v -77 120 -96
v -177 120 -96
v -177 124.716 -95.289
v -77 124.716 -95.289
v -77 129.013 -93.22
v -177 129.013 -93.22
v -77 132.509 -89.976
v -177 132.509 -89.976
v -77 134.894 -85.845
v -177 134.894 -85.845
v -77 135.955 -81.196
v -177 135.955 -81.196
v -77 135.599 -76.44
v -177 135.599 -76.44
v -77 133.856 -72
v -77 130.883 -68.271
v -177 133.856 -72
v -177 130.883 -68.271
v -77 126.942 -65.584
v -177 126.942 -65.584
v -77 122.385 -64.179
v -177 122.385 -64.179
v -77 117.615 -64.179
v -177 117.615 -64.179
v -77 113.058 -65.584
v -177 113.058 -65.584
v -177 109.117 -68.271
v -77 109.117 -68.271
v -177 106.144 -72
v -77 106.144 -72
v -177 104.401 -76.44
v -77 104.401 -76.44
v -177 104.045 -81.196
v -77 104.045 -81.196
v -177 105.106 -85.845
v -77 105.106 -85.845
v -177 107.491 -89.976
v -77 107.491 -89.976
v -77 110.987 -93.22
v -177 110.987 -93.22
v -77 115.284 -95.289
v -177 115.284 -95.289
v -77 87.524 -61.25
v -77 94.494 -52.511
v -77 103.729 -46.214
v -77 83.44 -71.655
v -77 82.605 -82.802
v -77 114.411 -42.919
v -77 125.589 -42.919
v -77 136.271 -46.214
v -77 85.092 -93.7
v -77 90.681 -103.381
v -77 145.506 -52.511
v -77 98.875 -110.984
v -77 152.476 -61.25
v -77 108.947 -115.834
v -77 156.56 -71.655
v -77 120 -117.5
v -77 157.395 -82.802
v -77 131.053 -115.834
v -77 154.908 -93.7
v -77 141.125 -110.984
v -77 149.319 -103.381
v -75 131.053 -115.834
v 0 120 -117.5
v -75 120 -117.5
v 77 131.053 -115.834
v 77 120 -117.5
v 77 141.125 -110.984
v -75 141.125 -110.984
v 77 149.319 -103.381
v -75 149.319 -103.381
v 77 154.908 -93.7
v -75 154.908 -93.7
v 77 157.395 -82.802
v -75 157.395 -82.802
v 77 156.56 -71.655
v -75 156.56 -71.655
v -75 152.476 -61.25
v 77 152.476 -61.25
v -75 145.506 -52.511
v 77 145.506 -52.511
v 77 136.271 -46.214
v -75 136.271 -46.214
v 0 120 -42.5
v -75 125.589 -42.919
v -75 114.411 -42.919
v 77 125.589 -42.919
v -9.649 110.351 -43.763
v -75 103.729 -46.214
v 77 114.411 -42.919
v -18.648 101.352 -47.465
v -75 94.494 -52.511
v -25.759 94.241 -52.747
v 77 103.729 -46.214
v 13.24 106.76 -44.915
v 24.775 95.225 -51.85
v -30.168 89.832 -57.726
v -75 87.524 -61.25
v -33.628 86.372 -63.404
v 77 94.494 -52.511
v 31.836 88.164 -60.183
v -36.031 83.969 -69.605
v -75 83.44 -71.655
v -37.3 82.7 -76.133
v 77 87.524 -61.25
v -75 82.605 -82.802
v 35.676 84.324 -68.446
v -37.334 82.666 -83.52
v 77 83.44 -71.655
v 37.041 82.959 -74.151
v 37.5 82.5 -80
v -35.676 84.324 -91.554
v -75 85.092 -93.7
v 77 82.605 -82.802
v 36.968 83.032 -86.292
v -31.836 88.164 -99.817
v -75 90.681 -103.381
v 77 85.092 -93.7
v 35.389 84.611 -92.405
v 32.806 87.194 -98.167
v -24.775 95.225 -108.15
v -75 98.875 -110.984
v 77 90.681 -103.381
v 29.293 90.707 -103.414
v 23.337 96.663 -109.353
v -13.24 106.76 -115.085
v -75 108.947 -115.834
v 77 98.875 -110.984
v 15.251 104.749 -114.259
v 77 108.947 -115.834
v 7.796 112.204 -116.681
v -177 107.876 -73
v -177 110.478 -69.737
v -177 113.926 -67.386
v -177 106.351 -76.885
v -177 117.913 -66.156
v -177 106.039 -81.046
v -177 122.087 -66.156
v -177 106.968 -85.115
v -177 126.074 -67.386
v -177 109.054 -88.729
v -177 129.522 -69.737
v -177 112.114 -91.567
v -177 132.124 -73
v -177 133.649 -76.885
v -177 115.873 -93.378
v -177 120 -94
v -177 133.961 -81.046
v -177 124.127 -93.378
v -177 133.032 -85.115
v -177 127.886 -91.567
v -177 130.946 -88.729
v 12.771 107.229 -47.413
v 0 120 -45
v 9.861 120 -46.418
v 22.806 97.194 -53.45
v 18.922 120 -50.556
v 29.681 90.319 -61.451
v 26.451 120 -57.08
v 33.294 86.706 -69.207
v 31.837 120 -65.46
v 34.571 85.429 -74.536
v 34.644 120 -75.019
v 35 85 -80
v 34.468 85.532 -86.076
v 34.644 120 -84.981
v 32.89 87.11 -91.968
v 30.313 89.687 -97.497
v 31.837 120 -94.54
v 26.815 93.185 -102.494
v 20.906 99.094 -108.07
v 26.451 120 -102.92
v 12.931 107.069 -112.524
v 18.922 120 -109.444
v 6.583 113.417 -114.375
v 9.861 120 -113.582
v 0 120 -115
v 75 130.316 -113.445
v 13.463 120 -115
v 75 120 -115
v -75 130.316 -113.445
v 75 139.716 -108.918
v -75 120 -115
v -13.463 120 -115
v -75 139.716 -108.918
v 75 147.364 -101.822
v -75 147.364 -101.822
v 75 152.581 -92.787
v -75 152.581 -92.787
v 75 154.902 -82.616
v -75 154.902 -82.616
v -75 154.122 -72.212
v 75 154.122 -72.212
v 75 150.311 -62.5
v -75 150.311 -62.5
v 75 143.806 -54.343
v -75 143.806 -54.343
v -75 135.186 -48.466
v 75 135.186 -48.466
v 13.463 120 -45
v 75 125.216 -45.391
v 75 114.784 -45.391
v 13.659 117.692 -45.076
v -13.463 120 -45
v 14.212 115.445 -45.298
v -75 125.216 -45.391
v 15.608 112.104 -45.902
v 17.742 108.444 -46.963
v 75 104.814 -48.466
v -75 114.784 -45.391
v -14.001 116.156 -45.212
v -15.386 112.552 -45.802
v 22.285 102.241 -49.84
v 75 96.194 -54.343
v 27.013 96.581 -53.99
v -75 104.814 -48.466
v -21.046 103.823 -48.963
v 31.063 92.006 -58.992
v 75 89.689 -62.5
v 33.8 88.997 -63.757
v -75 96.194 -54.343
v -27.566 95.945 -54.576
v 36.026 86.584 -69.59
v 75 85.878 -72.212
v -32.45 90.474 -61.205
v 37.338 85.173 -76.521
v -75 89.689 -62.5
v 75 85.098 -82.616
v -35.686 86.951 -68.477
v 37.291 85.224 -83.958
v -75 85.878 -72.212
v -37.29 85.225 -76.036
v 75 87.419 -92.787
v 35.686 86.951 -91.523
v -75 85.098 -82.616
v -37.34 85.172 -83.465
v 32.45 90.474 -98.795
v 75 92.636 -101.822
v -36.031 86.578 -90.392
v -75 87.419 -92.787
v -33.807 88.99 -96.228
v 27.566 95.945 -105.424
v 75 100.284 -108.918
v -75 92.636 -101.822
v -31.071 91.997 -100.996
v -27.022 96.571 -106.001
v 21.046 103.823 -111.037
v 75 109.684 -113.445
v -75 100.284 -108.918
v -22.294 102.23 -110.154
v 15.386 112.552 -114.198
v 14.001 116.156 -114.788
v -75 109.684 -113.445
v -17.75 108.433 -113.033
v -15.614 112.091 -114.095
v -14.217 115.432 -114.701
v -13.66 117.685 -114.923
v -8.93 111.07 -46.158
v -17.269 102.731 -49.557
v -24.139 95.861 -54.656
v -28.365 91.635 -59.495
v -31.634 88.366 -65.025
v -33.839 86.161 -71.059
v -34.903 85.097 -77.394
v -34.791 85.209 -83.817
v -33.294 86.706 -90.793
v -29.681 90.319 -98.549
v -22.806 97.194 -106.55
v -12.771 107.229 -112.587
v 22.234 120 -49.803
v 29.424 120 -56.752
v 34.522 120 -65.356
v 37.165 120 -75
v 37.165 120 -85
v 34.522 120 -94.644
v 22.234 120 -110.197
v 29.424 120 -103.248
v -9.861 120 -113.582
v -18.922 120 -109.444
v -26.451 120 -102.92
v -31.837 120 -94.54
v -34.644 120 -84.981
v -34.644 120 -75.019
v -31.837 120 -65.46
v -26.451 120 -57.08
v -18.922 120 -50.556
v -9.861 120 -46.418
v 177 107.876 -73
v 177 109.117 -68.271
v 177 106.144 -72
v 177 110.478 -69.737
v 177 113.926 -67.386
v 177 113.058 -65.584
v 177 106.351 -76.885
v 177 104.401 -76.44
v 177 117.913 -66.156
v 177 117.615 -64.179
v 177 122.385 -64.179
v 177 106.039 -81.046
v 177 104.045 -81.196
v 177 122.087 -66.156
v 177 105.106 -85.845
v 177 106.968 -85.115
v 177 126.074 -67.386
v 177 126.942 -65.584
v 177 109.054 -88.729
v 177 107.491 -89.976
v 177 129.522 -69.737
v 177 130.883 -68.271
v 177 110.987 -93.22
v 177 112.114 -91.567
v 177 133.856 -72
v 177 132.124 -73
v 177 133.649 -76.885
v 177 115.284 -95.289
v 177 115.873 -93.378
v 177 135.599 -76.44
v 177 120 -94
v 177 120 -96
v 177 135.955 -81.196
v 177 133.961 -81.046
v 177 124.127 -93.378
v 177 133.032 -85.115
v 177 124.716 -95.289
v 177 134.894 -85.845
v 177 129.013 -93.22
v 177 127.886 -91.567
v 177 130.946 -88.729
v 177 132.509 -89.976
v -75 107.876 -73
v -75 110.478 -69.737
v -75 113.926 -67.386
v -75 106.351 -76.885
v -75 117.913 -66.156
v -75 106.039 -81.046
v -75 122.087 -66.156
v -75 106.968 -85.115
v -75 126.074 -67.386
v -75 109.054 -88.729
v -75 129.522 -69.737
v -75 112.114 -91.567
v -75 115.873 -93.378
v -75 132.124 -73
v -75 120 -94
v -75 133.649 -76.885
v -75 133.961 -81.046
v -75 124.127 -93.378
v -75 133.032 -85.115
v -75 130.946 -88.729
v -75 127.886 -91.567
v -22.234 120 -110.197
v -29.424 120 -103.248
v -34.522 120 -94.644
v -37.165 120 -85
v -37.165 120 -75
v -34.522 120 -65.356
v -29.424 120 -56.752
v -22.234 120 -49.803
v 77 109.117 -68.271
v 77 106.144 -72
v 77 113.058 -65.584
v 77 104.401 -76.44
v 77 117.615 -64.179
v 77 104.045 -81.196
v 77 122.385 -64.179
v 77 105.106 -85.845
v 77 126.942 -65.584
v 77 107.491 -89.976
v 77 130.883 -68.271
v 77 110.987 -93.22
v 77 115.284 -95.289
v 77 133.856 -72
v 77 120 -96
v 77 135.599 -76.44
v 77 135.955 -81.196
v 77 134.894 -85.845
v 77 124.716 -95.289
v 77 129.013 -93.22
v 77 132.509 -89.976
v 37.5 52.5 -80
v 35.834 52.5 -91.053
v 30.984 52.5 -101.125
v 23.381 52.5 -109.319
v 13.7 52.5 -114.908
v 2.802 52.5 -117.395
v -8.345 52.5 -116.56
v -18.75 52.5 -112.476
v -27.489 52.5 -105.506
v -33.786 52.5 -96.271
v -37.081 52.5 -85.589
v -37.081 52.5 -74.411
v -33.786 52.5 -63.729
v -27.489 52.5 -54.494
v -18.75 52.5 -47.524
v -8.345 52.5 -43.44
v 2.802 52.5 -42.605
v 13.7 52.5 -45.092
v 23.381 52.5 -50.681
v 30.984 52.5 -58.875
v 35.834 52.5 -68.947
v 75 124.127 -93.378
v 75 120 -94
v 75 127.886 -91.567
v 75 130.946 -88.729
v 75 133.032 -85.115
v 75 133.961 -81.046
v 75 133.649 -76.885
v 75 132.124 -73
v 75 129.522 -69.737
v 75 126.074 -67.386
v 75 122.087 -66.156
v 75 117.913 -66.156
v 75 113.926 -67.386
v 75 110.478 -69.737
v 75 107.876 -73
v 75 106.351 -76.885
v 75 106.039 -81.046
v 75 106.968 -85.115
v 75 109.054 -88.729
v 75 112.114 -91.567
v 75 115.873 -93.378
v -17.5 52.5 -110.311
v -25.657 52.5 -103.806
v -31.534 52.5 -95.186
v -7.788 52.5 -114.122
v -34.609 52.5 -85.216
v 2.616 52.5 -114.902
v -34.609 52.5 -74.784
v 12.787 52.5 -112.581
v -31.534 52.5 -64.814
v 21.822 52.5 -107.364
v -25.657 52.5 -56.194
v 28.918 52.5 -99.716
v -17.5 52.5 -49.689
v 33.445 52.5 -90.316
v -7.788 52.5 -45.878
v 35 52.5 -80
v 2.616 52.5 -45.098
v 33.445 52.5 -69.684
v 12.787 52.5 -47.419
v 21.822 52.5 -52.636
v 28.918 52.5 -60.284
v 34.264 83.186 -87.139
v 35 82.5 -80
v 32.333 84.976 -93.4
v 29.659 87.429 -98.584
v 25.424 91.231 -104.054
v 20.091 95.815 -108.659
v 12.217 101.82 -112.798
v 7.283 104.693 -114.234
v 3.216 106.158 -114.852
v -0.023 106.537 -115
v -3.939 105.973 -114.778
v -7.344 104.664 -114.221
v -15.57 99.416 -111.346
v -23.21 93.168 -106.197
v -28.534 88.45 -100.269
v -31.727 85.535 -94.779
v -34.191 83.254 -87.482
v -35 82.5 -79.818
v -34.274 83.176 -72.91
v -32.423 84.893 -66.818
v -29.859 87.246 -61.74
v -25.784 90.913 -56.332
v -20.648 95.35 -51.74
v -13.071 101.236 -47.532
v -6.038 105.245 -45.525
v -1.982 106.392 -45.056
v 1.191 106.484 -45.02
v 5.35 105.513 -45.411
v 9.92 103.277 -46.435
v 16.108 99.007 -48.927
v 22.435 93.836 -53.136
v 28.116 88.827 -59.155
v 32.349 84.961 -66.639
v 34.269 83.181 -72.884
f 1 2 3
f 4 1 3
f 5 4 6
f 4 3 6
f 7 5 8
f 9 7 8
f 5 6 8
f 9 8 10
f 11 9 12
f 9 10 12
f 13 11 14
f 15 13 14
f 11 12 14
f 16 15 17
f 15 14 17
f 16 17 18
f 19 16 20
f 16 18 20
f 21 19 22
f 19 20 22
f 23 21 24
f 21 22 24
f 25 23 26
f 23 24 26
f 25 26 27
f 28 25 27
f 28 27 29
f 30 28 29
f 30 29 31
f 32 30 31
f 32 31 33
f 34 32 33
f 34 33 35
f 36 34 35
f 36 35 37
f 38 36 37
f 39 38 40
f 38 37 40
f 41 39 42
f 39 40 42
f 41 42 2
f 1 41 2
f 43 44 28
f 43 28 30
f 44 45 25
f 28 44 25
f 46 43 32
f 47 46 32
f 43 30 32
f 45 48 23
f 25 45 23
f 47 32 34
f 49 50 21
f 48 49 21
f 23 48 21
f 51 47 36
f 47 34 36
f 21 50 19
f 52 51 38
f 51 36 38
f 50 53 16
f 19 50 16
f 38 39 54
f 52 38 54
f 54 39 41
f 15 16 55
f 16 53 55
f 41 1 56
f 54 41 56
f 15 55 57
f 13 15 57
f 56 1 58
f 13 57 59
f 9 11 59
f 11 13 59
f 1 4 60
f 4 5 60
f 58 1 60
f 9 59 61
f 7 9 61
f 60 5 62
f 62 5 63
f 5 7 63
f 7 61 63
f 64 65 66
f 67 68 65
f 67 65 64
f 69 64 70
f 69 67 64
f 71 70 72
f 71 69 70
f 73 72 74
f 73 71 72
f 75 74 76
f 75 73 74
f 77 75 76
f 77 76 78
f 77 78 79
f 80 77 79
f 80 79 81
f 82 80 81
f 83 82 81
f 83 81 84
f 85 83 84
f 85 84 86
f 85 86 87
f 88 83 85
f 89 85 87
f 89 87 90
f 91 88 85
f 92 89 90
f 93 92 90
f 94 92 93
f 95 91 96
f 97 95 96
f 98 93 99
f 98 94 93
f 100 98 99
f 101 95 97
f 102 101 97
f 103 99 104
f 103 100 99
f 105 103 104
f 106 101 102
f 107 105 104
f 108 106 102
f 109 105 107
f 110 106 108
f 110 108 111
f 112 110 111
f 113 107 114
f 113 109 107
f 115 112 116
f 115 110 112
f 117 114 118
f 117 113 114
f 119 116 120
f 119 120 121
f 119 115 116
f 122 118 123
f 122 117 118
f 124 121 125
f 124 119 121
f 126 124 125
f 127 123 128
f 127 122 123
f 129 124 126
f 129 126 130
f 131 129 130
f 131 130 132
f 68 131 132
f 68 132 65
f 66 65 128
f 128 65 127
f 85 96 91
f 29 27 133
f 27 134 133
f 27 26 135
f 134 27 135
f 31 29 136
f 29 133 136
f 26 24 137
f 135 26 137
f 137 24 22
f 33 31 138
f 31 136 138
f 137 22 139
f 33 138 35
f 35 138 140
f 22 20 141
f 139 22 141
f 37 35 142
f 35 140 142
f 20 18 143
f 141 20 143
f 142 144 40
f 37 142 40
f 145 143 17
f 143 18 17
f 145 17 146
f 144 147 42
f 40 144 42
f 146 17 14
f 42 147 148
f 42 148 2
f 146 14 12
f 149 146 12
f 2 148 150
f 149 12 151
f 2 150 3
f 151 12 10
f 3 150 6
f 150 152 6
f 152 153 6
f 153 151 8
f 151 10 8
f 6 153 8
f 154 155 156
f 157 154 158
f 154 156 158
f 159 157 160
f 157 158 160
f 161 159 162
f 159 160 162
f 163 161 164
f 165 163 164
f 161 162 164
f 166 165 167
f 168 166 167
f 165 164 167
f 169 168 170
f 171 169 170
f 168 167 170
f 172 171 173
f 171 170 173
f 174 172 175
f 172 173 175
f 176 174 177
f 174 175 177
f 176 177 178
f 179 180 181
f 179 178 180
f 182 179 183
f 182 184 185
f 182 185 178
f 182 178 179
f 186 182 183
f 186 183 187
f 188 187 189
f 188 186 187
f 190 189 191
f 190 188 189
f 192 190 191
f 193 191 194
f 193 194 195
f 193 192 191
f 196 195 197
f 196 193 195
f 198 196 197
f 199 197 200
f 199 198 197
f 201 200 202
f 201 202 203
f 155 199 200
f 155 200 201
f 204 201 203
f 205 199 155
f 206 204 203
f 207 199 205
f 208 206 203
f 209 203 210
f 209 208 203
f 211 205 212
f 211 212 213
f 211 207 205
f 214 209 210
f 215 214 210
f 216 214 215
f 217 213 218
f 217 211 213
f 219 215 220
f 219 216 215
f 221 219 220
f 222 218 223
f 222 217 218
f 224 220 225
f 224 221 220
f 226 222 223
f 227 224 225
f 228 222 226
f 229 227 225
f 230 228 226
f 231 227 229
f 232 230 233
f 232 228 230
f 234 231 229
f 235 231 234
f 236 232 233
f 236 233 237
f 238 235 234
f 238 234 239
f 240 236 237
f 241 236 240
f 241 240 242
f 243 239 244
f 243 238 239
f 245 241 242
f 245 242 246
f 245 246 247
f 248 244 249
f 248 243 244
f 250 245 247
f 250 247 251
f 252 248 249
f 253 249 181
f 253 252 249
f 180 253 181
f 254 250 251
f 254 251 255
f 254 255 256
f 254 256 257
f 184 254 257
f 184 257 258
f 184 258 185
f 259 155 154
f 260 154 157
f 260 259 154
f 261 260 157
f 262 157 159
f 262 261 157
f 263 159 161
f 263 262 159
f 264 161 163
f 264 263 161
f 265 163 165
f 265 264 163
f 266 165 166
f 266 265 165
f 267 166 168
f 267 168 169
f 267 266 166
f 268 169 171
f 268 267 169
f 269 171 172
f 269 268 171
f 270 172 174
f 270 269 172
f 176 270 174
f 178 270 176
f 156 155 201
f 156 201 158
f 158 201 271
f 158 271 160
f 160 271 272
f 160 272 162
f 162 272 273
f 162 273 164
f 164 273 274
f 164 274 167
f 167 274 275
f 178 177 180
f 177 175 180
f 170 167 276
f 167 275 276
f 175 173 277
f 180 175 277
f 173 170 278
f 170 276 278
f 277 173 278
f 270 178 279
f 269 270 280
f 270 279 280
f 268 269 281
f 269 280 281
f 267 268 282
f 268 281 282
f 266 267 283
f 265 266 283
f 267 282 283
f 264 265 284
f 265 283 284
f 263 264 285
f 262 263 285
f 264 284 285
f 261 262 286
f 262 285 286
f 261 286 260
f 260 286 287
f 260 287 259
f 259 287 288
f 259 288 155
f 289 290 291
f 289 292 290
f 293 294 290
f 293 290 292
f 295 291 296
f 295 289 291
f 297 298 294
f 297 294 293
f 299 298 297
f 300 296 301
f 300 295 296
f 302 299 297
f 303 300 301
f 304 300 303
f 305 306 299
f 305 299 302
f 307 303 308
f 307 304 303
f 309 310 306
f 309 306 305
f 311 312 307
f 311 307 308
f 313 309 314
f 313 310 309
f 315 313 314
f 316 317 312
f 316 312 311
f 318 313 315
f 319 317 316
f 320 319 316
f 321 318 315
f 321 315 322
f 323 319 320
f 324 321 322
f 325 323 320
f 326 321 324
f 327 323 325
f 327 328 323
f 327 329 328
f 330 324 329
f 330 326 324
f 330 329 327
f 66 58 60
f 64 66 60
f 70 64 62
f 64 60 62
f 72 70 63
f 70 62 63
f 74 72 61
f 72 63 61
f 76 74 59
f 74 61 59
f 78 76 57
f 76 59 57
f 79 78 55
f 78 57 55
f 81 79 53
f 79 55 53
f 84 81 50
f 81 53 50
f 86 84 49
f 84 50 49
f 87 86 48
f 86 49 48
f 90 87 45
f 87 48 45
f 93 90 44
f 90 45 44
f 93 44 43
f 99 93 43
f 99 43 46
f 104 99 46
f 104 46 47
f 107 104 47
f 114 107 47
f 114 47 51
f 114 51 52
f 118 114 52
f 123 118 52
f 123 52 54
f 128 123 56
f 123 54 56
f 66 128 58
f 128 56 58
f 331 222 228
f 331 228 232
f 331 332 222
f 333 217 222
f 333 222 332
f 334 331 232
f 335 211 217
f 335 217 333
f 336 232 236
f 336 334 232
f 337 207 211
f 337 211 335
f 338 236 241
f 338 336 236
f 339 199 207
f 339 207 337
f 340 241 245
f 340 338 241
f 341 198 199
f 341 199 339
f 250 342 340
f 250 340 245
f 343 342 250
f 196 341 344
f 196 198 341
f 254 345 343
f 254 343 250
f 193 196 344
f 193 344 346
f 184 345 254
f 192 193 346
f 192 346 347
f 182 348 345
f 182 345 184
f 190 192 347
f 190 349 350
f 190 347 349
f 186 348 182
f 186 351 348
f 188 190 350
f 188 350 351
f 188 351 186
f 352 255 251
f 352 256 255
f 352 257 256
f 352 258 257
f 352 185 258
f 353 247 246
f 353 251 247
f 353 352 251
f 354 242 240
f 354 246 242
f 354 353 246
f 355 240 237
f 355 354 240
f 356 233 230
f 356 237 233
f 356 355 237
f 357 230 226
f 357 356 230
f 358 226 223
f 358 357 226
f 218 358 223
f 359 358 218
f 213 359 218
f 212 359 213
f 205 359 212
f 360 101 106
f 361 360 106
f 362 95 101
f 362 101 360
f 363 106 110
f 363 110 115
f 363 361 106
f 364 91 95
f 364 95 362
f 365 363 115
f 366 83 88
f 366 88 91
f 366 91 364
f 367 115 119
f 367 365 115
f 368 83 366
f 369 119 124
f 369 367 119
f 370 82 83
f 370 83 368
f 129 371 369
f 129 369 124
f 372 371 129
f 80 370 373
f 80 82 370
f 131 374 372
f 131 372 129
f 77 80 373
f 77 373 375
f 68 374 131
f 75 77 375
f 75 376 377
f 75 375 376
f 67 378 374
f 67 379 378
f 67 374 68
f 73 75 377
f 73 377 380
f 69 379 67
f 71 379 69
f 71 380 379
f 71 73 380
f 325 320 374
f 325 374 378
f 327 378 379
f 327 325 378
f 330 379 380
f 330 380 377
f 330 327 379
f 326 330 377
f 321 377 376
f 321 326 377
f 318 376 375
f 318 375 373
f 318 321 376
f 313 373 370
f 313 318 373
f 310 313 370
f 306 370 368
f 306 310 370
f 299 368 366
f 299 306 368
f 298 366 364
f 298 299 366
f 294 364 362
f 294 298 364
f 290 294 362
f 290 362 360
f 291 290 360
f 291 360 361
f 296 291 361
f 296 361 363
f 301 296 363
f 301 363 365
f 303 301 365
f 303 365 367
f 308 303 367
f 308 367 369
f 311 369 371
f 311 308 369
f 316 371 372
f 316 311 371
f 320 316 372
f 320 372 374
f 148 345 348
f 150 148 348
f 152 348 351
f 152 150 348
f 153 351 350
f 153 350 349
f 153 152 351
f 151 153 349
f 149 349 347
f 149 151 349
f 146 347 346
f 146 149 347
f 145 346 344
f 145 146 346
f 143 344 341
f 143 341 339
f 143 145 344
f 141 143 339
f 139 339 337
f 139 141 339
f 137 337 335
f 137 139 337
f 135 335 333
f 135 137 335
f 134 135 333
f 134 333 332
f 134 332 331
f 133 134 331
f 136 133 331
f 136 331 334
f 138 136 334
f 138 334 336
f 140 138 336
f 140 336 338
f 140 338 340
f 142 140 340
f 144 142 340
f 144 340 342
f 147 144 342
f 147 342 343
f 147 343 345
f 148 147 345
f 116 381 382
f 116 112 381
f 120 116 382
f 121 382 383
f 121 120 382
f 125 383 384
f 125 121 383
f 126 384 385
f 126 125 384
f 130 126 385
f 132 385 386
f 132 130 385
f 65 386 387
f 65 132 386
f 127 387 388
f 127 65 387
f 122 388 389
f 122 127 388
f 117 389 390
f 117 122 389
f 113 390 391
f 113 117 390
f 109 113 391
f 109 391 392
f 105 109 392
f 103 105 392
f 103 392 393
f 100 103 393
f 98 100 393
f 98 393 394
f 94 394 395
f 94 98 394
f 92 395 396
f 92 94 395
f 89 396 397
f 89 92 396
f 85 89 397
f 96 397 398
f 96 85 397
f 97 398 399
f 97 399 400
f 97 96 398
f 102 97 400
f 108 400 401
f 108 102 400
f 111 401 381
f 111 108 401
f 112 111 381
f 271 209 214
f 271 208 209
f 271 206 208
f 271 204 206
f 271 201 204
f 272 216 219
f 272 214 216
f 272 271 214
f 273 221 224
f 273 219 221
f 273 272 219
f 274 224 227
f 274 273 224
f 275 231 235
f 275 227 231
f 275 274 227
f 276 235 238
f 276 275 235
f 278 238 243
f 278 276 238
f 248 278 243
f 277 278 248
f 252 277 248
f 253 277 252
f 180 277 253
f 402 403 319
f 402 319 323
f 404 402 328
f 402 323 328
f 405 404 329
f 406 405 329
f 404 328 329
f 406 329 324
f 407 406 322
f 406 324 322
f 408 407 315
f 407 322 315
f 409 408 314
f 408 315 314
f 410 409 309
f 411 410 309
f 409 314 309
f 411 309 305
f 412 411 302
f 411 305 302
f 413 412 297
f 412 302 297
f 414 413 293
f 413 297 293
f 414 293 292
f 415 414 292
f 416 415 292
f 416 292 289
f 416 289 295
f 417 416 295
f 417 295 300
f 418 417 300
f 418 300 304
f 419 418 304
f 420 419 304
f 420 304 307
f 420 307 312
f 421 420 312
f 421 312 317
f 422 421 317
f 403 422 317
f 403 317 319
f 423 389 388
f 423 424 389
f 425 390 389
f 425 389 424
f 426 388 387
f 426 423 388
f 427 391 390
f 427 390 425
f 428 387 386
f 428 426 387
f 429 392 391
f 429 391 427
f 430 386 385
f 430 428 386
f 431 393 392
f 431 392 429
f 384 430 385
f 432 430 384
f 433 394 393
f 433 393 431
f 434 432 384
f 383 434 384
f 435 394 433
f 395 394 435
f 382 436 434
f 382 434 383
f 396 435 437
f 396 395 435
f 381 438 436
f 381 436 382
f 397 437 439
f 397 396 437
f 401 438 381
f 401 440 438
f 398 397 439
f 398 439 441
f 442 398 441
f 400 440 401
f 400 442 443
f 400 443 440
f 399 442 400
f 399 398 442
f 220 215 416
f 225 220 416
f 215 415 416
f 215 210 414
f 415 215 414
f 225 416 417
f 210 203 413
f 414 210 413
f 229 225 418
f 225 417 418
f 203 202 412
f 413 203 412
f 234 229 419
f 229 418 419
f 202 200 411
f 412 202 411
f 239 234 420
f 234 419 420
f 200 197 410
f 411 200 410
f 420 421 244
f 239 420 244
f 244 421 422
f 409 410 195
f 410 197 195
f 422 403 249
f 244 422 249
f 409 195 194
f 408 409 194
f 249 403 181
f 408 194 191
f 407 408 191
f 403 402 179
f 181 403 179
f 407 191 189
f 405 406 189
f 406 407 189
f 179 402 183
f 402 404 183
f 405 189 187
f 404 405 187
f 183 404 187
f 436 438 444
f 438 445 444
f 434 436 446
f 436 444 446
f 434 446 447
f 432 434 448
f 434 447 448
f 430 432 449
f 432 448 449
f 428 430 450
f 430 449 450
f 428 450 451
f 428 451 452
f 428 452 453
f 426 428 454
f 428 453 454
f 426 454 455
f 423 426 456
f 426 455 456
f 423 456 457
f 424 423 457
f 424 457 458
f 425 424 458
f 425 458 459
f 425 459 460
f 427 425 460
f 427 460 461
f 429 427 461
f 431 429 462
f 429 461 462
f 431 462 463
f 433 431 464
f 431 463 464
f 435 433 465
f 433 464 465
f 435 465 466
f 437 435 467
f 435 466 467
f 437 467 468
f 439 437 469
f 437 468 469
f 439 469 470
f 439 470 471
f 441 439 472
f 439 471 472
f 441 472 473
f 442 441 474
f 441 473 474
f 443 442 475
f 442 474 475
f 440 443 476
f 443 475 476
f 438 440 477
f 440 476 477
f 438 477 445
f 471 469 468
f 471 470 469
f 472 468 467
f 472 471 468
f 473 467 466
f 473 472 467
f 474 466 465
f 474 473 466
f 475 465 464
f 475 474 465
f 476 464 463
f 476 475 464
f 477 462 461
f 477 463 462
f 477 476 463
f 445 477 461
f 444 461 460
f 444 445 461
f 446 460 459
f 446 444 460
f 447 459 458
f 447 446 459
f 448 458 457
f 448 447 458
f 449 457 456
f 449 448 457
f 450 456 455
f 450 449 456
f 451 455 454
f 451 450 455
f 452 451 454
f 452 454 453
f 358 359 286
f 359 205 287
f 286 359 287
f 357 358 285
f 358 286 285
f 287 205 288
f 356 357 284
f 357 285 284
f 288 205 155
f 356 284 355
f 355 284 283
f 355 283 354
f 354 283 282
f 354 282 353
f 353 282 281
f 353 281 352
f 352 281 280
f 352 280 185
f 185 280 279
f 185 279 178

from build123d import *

# Parameters (mm, degrees)
SKETCH_1_R          = 37.5
SKETCH_1_R_2        = 35
SKETCH_4_R          = 37.5
SKETCH_4_R_2        = 35
EXTRUDE_1_DEPTH     = 75
EXTRUDE_START       = 2
SKETCH_5_R          = 37.5
SKETCH_5_R_2        = 14
EXTRUDE_2_DEPTH     = 2
EXTRUDE_START_2     = 100
SKETCH_6_R          = 16
SKETCH_6_R_2        = 14
EXTRUDE_3_DEPTH     = 100
SKETCH_7_W          = 164.087293052
SKETCH_7_H          = 105
CUT_EXTRUDE_1_DEPTH = 265.464553435


with BuildPart() as part:
    # 扫描2: sweep along a path in 草图2
    with BuildLine(Plane(origin=(0, 0, 0), x_dir=(0, 0, -1), z_dir=(1, 0, 0))) as sweep_2_path:
        Line((0, 0), (40, 0))
        ThreePointArc((40, 0), (68.284271247, 11.715728753), (80, 40))
        Line((80, 40), (80, 120))
    # 草图1 → 扫描2 (sweep)
    with BuildSketch(Plane.XY):
        Circle(SKETCH_1_R)
        Circle(SKETCH_1_R_2, mode=Mode.SUBTRACT)
    sweep(path=sweep_2_path.line)

    # 草图4 → 凸台-拉伸1 (add, symmetric)
    with BuildSketch(Plane(origin=(0, 0, 0), x_dir=(0, 0, -1), z_dir=(1, 0, 0))):
        with Locations((80, 120)):
            Circle(SKETCH_4_R)
        with Locations((80, 120)):
            Circle(SKETCH_4_R_2, mode=Mode.SUBTRACT)
    extrude(amount=EXTRUDE_1_DEPTH, both=True)

    # 草图5 → 凸台-拉伸2 (add)
    with BuildSketch(Plane(origin=(75, 0, 0), x_dir=(0, 0, -1), z_dir=(1, 0, 0)).offset(EXTRUDE_START)):
        with Locations((80, 120)):
            Circle(SKETCH_5_R)
        with Locations((80, 120)):
            Circle(SKETCH_5_R_2, mode=Mode.SUBTRACT)
    extrude_2 = extrude(amount=-EXTRUDE_2_DEPTH)

    # 草图6 → 凸台-拉伸3 (add)
    with BuildSketch(Plane(origin=(77, 0, 0), x_dir=(0, 0, -1), z_dir=(1, 0, 0)).offset(EXTRUDE_START_2)):
        with Locations((80, 120)):
            Circle(SKETCH_6_R)
        with Locations((80, 120)):
            Circle(SKETCH_6_R_2, mode=Mode.SUBTRACT)
    extrude_3 = extrude(amount=-EXTRUDE_3_DEPTH)

    # 镜向1: 凸台-拉伸2, 凸台-拉伸3 across plane
    add(extrude_2.mirror(Plane(origin=(0, 0, 0), x_dir=(0, 0, 1), z_dir=(1, 0, 0))))
    add(extrude_3.mirror(Plane(origin=(0, 0, 0), x_dir=(0, 0, 1), z_dir=(1, 0, 0))))

    # 草图7 → 切除-拉伸1 (cut, through all)
    with BuildSketch(Plane.XY):
        Rectangle(SKETCH_7_W, SKETCH_7_H)
    extrude(amount=-CUT_EXTRUDE_1_DEPTH, mode=Mode.SUBTRACT)


solid = part.part
